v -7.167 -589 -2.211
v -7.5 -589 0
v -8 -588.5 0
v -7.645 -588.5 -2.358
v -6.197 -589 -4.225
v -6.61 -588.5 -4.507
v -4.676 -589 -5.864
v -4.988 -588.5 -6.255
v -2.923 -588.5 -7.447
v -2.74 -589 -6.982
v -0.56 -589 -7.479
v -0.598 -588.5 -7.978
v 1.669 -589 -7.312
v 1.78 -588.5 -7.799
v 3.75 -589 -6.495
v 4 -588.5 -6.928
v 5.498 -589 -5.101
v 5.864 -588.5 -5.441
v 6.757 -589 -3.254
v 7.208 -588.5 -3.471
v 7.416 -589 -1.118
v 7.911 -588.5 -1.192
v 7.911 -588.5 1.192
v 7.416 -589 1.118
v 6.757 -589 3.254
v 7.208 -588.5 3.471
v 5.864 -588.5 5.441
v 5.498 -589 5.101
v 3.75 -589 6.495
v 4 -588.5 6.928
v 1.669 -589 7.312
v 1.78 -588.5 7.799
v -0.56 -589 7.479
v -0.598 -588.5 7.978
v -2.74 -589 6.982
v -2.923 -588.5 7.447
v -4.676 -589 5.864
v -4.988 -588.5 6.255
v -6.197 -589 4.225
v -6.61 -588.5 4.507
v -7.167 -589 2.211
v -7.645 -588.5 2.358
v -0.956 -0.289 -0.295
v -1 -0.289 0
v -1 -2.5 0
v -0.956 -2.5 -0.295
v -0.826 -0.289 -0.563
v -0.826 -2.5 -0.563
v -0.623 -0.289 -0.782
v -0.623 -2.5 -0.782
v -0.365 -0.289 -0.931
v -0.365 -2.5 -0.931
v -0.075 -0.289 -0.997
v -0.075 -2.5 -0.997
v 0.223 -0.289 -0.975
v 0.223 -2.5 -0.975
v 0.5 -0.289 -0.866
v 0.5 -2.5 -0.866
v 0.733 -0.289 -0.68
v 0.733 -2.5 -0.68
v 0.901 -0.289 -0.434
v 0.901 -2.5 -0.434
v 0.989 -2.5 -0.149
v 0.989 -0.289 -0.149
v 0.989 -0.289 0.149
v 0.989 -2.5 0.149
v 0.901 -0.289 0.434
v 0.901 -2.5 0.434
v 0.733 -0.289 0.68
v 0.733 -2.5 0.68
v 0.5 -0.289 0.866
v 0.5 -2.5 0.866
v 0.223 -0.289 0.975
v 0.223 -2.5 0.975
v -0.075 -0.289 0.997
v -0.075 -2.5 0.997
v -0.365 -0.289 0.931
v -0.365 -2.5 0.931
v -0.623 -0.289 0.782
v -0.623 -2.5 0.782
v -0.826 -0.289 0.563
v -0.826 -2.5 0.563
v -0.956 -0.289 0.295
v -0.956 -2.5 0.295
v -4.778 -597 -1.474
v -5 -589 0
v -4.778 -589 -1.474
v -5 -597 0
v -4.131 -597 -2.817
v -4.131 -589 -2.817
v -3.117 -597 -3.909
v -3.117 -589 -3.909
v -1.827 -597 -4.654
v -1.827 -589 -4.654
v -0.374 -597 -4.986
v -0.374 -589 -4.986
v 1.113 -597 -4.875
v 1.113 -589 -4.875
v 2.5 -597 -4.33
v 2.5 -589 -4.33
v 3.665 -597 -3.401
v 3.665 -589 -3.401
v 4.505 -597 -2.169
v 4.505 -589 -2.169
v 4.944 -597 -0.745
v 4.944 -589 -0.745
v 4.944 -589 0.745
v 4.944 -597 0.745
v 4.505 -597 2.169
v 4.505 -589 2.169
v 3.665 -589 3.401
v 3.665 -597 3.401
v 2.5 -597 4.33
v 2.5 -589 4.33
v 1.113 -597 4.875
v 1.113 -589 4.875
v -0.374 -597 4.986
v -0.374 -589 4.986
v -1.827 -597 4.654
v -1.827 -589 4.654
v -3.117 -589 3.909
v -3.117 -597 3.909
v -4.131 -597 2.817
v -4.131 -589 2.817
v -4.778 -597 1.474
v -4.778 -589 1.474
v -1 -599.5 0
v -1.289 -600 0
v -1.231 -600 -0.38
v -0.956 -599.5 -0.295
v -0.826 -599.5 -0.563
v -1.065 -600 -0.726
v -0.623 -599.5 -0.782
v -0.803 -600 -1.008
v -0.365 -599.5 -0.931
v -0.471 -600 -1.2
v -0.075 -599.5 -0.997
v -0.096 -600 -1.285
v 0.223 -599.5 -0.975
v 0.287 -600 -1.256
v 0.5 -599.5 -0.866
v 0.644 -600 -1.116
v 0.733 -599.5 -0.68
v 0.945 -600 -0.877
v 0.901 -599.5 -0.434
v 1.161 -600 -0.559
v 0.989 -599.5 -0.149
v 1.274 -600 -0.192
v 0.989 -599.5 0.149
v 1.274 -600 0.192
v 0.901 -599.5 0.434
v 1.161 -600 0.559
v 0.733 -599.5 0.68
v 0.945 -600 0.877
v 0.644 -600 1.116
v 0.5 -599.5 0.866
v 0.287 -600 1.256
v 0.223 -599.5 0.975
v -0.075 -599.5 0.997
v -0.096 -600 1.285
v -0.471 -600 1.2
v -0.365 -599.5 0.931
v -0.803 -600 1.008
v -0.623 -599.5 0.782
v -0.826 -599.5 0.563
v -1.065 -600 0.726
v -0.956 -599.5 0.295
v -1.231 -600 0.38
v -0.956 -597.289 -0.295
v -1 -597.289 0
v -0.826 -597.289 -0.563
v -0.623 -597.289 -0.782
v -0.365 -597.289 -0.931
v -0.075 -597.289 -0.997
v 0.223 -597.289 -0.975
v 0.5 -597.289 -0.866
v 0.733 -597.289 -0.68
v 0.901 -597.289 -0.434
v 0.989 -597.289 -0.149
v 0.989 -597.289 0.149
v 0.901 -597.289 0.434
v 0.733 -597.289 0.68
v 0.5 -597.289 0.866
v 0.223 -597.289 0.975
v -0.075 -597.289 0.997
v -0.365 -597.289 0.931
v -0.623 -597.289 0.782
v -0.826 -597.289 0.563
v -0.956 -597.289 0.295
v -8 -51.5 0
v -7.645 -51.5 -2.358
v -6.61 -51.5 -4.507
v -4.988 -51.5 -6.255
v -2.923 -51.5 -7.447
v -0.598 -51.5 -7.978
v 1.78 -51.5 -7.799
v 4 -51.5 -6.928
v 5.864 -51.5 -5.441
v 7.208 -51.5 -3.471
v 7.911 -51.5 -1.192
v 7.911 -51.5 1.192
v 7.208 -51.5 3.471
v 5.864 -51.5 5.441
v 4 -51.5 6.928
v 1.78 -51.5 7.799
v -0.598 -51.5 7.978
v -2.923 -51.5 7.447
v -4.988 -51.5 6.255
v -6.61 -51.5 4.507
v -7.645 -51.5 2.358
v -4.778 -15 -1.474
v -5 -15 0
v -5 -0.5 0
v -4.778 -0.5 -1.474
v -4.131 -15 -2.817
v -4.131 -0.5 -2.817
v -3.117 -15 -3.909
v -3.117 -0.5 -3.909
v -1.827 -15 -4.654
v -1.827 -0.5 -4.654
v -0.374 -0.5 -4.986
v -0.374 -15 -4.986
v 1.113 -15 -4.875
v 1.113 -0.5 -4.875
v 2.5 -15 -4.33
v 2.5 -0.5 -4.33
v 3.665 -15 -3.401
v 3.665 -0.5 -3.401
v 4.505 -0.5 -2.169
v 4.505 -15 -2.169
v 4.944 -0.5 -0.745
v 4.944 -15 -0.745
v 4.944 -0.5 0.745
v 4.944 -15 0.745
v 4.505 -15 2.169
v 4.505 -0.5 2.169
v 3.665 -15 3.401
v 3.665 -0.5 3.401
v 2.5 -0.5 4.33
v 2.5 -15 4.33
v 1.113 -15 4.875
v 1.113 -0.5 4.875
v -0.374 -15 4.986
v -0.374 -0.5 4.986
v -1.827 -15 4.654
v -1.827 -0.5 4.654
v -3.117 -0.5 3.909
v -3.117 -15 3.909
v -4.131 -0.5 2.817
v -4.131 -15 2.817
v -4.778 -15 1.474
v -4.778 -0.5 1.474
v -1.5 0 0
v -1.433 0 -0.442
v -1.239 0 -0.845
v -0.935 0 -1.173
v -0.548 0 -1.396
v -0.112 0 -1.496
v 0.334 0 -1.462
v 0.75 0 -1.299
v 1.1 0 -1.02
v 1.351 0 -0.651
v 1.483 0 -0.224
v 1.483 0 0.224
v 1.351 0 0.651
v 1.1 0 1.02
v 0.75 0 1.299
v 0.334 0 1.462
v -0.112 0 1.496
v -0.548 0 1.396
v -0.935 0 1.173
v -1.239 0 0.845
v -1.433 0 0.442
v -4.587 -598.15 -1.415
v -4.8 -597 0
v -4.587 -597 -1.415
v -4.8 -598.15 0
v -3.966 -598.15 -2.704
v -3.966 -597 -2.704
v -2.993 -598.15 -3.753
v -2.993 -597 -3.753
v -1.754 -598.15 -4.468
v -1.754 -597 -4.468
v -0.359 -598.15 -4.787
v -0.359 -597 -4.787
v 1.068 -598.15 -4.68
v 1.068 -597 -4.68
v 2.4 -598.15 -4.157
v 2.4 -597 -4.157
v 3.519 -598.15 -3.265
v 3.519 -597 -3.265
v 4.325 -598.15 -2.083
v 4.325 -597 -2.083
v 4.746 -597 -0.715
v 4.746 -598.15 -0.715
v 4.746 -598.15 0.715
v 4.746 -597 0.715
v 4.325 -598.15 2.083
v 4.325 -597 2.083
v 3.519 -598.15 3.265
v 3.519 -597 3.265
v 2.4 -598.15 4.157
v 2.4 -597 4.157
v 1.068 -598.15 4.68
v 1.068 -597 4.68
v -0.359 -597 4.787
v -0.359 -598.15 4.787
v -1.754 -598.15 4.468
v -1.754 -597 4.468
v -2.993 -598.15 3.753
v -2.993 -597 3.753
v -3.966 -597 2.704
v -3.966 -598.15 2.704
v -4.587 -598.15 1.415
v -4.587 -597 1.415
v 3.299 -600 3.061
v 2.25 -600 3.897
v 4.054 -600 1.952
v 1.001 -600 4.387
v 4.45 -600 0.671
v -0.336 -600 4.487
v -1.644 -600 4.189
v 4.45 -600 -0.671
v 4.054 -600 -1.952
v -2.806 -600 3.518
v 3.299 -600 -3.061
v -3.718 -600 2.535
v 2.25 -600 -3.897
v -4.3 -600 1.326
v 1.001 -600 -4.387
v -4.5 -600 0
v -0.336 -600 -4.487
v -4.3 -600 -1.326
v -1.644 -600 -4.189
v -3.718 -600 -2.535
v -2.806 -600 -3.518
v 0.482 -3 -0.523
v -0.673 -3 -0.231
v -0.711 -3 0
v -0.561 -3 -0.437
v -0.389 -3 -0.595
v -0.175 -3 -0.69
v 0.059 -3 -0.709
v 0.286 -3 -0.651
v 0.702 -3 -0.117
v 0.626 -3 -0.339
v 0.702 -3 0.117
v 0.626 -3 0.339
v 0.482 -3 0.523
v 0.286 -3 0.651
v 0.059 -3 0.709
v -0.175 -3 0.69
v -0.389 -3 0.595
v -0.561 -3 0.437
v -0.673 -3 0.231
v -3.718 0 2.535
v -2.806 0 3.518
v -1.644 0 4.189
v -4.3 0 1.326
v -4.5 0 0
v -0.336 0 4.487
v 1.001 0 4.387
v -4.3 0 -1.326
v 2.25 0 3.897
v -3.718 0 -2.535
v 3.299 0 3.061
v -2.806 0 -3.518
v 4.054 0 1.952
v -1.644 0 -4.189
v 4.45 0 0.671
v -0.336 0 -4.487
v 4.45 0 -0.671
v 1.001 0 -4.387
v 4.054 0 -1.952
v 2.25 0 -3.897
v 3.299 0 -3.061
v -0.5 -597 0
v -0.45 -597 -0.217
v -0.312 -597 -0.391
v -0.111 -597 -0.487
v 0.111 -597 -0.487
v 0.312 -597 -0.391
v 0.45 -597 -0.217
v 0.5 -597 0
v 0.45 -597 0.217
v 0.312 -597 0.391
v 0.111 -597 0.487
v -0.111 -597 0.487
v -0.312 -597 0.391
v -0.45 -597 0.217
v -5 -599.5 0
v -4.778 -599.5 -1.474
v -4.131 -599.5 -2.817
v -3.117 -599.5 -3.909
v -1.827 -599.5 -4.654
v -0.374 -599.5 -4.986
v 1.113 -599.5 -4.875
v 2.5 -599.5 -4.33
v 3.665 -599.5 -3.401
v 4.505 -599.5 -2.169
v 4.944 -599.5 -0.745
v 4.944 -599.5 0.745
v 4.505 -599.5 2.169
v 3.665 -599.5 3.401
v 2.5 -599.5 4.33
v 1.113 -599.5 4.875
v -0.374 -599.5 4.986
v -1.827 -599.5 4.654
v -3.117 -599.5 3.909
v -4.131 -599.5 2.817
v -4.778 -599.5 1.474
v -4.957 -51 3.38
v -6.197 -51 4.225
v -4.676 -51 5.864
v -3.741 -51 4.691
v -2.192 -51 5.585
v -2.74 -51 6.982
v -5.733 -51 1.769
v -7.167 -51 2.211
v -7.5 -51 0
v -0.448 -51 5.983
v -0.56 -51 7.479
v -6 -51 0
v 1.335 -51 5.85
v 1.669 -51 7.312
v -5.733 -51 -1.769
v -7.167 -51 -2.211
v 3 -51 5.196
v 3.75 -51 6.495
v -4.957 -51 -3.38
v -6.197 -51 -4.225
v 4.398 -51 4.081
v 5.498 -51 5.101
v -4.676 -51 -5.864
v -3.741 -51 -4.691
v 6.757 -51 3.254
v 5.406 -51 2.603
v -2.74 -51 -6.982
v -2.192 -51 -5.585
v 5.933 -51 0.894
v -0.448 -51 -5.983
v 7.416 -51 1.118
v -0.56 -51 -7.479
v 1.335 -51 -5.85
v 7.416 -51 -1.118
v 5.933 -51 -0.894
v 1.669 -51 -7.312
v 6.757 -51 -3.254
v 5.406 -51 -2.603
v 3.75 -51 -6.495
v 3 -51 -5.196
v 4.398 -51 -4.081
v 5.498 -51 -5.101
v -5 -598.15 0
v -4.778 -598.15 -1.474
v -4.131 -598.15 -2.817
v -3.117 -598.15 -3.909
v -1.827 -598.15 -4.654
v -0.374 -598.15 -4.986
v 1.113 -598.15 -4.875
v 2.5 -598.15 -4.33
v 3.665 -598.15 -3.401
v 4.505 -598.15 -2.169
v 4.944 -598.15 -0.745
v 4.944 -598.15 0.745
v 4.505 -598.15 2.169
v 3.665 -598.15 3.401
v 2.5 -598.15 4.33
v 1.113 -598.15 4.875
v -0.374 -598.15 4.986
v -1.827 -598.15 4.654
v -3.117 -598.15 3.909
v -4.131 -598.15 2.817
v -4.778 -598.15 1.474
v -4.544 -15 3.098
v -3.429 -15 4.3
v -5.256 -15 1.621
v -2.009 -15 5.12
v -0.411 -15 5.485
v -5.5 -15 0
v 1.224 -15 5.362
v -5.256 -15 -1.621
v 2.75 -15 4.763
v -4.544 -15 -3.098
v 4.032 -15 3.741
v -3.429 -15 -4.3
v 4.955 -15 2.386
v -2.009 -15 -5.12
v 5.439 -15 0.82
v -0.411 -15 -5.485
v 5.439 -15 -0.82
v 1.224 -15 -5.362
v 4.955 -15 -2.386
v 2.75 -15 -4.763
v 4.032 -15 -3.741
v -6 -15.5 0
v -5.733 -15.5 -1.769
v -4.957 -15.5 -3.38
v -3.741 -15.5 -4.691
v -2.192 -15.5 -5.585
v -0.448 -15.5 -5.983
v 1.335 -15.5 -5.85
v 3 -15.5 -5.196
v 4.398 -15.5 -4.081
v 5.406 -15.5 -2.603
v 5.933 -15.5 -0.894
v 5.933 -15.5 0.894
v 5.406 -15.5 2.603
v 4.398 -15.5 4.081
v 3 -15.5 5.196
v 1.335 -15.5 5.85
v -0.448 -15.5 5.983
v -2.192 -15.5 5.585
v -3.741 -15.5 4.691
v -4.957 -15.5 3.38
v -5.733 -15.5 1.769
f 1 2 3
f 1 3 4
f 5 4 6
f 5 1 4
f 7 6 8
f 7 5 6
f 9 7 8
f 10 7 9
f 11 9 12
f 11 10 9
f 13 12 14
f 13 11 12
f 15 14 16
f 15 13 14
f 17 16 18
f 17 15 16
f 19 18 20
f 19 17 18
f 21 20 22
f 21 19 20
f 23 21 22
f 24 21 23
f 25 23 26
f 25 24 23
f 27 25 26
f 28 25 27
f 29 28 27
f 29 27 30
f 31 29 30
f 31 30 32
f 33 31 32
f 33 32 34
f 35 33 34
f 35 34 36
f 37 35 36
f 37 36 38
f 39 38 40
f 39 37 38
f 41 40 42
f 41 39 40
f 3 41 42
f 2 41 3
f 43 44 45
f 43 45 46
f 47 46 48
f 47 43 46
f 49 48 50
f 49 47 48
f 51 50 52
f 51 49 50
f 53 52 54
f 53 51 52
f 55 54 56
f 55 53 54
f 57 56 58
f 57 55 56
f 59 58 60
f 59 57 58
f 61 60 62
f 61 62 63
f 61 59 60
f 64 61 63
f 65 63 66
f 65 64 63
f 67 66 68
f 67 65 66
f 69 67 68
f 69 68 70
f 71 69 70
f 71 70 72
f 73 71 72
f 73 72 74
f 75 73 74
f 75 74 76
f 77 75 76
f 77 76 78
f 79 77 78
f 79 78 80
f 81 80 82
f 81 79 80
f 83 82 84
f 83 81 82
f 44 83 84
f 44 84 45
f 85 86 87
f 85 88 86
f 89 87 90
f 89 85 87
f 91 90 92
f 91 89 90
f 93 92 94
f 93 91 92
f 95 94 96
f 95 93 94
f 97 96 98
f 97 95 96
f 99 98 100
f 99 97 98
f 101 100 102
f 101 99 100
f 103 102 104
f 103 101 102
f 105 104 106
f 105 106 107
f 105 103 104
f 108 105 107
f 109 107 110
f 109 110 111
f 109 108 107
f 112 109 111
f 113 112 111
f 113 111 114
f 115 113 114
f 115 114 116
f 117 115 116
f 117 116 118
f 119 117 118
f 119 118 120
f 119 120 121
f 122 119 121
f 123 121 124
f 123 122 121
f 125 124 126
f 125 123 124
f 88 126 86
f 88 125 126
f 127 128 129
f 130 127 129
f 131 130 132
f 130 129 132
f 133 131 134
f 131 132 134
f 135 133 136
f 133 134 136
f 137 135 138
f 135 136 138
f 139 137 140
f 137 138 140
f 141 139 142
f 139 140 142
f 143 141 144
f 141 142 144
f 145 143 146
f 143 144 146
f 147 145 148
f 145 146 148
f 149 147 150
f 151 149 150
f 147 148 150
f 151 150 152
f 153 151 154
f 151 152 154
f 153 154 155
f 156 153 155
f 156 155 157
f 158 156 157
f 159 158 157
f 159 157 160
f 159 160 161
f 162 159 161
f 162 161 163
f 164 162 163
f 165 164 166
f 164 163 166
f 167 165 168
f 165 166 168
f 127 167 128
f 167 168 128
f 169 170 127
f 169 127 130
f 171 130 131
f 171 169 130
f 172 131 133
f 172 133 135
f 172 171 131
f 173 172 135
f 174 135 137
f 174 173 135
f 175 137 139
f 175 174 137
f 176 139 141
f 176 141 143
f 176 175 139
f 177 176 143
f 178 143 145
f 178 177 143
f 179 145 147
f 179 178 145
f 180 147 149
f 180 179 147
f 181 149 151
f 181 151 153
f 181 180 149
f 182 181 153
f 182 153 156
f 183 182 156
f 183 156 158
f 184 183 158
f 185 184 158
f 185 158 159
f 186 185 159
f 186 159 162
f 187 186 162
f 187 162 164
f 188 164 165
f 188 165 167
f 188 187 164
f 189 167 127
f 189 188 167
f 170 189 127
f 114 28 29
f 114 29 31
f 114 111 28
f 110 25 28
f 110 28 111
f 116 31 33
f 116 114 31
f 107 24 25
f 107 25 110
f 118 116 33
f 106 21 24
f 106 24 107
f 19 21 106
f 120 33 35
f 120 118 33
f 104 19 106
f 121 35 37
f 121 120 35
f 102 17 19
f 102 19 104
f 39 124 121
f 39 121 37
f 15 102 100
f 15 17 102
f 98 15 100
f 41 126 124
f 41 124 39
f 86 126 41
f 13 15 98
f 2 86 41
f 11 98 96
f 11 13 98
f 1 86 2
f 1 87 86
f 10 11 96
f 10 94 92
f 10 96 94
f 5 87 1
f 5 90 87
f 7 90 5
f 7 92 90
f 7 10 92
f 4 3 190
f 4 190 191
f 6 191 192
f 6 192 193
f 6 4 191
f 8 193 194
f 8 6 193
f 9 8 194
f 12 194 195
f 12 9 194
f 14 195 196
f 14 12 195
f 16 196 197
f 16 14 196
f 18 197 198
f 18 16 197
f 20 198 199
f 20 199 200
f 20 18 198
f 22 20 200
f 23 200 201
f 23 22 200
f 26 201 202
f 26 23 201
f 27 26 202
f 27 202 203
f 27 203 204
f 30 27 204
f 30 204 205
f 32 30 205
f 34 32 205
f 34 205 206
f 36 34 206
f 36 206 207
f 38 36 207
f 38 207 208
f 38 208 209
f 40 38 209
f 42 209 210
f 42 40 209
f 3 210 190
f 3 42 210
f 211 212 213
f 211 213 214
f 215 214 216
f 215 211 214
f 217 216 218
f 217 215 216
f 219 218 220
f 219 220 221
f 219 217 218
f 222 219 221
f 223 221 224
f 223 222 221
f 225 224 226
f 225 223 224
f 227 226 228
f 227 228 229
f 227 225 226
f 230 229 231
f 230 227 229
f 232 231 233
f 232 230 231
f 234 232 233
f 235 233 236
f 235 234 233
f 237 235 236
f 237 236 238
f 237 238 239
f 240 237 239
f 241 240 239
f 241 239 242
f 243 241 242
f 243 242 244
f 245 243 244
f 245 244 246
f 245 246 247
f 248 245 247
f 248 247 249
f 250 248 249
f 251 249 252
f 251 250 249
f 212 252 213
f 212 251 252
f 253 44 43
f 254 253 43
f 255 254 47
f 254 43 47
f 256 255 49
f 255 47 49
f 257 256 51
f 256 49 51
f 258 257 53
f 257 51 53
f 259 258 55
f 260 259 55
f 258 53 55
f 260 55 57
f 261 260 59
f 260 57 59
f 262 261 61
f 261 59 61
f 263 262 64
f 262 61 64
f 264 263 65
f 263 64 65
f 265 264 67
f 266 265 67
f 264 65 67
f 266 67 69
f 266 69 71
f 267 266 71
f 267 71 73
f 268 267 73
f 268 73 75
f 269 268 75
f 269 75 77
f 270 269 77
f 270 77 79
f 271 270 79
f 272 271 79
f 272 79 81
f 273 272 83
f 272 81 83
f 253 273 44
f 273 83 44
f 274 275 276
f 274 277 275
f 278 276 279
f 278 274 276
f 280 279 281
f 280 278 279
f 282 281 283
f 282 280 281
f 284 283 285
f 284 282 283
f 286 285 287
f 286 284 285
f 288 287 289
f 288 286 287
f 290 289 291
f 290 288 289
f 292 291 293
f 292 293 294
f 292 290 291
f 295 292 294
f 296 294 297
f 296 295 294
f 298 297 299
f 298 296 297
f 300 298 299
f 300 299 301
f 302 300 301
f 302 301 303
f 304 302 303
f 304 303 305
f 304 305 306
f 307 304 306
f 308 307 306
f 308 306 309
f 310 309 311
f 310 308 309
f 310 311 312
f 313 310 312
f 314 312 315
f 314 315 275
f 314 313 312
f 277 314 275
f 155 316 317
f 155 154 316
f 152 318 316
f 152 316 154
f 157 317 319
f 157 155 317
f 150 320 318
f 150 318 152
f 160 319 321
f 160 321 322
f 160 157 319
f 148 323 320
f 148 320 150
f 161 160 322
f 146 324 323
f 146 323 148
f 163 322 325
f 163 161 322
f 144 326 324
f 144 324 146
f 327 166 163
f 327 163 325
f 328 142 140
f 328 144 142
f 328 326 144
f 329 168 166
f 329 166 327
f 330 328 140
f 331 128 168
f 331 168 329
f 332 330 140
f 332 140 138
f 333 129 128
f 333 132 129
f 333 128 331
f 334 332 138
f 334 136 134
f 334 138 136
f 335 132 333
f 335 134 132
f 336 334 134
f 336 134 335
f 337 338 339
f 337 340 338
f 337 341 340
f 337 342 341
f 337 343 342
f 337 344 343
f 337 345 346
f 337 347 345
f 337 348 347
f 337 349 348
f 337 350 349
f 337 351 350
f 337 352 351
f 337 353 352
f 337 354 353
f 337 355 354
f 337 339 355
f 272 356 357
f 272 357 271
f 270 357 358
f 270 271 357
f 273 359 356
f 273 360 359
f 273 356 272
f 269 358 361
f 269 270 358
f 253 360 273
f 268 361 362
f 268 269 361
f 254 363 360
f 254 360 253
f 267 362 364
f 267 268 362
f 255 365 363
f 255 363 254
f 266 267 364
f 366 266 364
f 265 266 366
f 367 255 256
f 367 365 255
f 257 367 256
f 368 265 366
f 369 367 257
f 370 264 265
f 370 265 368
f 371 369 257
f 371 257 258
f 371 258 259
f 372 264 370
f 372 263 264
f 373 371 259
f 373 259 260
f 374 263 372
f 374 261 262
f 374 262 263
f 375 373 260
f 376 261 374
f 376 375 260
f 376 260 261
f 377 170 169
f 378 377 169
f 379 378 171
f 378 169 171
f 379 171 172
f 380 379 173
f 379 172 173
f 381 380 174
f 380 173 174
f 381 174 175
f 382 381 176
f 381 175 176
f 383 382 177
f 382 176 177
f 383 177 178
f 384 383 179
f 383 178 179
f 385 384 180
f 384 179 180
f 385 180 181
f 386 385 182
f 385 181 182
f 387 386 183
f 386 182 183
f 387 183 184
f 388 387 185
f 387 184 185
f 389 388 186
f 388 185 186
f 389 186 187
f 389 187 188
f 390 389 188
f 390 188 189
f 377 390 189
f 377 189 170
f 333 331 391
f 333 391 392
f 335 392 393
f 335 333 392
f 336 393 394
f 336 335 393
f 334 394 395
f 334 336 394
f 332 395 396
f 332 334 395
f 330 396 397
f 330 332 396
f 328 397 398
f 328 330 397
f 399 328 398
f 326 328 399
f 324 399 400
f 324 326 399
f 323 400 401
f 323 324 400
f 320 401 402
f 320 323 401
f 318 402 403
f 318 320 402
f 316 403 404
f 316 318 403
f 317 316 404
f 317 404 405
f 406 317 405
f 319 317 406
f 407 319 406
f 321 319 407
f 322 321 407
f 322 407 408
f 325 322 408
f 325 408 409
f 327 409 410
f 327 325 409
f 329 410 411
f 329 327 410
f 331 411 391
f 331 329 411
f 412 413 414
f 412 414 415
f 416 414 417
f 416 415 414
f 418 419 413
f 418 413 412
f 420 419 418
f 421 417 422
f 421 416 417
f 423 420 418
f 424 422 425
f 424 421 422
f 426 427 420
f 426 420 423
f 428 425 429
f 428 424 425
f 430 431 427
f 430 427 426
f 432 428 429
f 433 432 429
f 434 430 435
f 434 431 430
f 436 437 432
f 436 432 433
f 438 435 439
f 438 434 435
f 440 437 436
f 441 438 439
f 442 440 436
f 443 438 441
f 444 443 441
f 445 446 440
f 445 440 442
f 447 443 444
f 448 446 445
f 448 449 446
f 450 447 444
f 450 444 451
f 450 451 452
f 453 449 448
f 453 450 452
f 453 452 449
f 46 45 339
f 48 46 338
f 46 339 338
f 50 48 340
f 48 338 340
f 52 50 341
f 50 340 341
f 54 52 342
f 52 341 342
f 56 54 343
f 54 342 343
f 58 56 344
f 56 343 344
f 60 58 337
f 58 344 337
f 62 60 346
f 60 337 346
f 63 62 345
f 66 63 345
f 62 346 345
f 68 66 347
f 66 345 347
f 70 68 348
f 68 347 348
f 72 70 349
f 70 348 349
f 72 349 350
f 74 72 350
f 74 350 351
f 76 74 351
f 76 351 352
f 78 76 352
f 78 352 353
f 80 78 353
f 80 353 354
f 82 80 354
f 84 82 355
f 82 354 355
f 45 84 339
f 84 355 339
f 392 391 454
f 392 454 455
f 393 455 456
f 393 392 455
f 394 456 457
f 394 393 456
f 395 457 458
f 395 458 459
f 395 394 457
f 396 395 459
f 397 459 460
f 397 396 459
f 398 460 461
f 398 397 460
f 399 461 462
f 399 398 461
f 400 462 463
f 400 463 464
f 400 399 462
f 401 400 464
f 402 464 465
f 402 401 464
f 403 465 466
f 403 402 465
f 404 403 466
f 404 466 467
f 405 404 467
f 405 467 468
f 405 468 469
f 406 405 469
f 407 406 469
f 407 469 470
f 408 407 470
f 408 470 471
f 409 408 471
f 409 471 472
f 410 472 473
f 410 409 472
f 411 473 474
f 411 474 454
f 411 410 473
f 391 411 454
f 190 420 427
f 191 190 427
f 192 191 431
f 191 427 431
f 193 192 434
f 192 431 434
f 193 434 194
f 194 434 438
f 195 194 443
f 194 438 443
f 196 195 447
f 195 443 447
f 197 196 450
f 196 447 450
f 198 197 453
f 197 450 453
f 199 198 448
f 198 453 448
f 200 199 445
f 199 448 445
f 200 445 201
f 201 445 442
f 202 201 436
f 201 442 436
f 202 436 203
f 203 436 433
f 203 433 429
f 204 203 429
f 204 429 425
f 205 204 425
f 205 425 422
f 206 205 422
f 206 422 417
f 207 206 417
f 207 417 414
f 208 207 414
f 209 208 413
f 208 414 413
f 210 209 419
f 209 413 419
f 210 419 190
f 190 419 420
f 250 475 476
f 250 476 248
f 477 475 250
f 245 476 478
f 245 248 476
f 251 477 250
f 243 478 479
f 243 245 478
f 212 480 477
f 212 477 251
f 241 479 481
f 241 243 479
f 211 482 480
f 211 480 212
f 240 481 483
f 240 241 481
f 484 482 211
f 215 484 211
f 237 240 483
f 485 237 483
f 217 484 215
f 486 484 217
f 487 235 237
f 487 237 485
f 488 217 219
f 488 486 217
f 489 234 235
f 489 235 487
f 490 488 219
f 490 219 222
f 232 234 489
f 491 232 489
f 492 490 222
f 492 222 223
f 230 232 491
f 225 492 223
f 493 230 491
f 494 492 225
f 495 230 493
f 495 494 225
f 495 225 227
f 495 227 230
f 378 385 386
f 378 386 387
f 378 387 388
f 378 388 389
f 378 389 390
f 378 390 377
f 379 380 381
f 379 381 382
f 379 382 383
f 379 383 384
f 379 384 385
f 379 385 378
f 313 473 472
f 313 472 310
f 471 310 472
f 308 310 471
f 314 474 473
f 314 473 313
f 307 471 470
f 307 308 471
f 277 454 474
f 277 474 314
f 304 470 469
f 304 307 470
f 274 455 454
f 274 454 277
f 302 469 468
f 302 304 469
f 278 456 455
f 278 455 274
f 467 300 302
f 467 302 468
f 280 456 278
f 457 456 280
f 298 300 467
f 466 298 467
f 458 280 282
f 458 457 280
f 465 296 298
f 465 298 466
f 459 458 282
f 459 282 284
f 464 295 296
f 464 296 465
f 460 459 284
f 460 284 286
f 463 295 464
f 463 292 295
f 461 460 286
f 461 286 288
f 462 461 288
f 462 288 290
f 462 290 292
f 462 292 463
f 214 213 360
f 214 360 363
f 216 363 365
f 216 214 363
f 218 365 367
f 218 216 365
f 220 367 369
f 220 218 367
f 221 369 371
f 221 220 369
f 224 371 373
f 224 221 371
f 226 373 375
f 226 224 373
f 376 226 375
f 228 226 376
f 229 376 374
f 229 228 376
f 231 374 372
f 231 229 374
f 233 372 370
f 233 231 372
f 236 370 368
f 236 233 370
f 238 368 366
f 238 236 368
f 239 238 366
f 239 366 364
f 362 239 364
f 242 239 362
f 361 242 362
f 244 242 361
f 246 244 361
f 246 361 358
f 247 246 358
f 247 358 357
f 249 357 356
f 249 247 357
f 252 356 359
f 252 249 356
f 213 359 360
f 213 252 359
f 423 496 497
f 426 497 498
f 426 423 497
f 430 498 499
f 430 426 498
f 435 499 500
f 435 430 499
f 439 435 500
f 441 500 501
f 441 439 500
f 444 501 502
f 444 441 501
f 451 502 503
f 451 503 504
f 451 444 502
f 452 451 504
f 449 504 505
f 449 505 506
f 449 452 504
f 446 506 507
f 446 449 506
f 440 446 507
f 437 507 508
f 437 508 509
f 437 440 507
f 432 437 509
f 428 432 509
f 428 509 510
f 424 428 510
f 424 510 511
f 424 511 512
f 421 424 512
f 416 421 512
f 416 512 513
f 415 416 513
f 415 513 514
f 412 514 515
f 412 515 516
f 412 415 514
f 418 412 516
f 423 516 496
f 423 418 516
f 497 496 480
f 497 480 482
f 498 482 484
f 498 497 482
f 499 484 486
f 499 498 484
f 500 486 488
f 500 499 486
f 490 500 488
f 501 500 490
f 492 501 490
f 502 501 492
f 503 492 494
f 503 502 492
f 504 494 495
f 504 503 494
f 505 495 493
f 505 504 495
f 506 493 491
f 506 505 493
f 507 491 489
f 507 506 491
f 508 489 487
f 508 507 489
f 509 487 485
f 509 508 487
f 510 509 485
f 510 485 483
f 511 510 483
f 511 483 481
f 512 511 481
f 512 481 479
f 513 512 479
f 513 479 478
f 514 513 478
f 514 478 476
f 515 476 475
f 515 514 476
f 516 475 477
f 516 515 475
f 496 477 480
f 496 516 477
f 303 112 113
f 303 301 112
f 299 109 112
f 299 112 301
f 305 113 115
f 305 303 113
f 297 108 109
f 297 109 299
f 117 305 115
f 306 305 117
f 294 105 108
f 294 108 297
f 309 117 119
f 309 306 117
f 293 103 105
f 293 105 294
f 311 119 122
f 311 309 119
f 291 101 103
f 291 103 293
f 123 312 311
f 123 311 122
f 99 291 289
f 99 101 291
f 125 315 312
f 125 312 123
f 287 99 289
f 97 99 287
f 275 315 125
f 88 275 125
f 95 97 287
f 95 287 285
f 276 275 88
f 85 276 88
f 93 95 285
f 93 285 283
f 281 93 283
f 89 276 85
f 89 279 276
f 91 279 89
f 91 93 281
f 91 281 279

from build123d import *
from OCP.BRepFilletAPI import BRepFilletAPI_MakeChamfer

# Parameters (mm, degrees)
CHAMFER1_SIZE  = 0.5
CHAMFER2_SIZE  = 0.5
CHAMFER2_SIZE2 = 0.288675135


with BuildPart() as part:
    # Sketch1 → Revolve1 (revolve)
    with BuildSketch(Plane.XY):
        Polygon((-8, -51), (-8, -589), (-5, -589), (-5, -597), (-4.8, -597), (-4.8, -598.15), (-5, -598.15), (-5, -600), (-1, -600), (-1, -597), (0, -597), (0, -3), (-1, -3), (-1, 0), (-5, 0), (-5, -15), (-6, -15), (-6, -51), align=None)
    revolve(axis=Axis((0, -3, 0), (0, -1, 0)))

    # Chamfer1
    chamfer1_edges = [part.edges().sort_by_distance(p)[0] for p in [
        (6, -15, 0),
        (8, -51, 0),
        (8, -589, 0),
        (5, -600, 0),
        (5, 0, 0),
    ]]
    chamfer(chamfer1_edges, length=CHAMFER1_SIZE)

    # Chamfer2: one chamfer whose edges measure the first distance from different faces: ONE call of the kernel's chamfer builder (chamfer() names one face for all edges)
    chamfer2_edges_1 = [part.edges().sort_by_distance(p)[0] for p in [
        (1, -600, 0),
    ]]
    chamfer2_side_1 = [part.faces().sort_by_distance(p)[0] for p in [
        (1, -598.5, 0),
    ]]
    chamfer2_edges_2 = [part.edges().sort_by_distance(p)[0] for p in [
        (1, -597, 0),
    ]]
    chamfer2_side_2 = [part.faces().sort_by_distance(p)[0] for p in [
        (0, -597, 0),
    ]]
    chamfer2_edges_3 = [part.edges().sort_by_distance(p)[0] for p in [
        (1, -3, 0),
    ]]
    chamfer2_side_3 = [part.faces().sort_by_distance(p)[0] for p in [
        (1, -1.5, 0),
    ]]
    chamfer2_edges_4 = [part.edges().sort_by_distance(p)[0] for p in [
        (1, 0, 0),
    ]]
    chamfer2_side_4 = [part.faces().sort_by_distance(p)[0] for p in [
        (4.372720779, 0, 0),
    ]]
    chamfer2 = BRepFilletAPI_MakeChamfer(part.part.solid().wrapped)
    for e in chamfer2_edges_1:
        chamfer2.Add(CHAMFER2_SIZE, CHAMFER2_SIZE2, e.wrapped, chamfer2_side_1[0].wrapped)  # the first distance lies on this face
    for e in chamfer2_edges_2:
        chamfer2.Add(CHAMFER2_SIZE, CHAMFER2_SIZE2, e.wrapped, chamfer2_side_2[0].wrapped)  # the first distance lies on this face
    for e in chamfer2_edges_3:
        chamfer2.Add(CHAMFER2_SIZE, CHAMFER2_SIZE2, e.wrapped, chamfer2_side_3[0].wrapped)  # the first distance lies on this face
    for e in chamfer2_edges_4:
        chamfer2.Add(CHAMFER2_SIZE, CHAMFER2_SIZE2, e.wrapped, chamfer2_side_4[0].wrapped)  # the first distance lies on this face
    add(Compound.cast(chamfer2.Shape()), mode=Mode.REPLACE)


solid = part.part
